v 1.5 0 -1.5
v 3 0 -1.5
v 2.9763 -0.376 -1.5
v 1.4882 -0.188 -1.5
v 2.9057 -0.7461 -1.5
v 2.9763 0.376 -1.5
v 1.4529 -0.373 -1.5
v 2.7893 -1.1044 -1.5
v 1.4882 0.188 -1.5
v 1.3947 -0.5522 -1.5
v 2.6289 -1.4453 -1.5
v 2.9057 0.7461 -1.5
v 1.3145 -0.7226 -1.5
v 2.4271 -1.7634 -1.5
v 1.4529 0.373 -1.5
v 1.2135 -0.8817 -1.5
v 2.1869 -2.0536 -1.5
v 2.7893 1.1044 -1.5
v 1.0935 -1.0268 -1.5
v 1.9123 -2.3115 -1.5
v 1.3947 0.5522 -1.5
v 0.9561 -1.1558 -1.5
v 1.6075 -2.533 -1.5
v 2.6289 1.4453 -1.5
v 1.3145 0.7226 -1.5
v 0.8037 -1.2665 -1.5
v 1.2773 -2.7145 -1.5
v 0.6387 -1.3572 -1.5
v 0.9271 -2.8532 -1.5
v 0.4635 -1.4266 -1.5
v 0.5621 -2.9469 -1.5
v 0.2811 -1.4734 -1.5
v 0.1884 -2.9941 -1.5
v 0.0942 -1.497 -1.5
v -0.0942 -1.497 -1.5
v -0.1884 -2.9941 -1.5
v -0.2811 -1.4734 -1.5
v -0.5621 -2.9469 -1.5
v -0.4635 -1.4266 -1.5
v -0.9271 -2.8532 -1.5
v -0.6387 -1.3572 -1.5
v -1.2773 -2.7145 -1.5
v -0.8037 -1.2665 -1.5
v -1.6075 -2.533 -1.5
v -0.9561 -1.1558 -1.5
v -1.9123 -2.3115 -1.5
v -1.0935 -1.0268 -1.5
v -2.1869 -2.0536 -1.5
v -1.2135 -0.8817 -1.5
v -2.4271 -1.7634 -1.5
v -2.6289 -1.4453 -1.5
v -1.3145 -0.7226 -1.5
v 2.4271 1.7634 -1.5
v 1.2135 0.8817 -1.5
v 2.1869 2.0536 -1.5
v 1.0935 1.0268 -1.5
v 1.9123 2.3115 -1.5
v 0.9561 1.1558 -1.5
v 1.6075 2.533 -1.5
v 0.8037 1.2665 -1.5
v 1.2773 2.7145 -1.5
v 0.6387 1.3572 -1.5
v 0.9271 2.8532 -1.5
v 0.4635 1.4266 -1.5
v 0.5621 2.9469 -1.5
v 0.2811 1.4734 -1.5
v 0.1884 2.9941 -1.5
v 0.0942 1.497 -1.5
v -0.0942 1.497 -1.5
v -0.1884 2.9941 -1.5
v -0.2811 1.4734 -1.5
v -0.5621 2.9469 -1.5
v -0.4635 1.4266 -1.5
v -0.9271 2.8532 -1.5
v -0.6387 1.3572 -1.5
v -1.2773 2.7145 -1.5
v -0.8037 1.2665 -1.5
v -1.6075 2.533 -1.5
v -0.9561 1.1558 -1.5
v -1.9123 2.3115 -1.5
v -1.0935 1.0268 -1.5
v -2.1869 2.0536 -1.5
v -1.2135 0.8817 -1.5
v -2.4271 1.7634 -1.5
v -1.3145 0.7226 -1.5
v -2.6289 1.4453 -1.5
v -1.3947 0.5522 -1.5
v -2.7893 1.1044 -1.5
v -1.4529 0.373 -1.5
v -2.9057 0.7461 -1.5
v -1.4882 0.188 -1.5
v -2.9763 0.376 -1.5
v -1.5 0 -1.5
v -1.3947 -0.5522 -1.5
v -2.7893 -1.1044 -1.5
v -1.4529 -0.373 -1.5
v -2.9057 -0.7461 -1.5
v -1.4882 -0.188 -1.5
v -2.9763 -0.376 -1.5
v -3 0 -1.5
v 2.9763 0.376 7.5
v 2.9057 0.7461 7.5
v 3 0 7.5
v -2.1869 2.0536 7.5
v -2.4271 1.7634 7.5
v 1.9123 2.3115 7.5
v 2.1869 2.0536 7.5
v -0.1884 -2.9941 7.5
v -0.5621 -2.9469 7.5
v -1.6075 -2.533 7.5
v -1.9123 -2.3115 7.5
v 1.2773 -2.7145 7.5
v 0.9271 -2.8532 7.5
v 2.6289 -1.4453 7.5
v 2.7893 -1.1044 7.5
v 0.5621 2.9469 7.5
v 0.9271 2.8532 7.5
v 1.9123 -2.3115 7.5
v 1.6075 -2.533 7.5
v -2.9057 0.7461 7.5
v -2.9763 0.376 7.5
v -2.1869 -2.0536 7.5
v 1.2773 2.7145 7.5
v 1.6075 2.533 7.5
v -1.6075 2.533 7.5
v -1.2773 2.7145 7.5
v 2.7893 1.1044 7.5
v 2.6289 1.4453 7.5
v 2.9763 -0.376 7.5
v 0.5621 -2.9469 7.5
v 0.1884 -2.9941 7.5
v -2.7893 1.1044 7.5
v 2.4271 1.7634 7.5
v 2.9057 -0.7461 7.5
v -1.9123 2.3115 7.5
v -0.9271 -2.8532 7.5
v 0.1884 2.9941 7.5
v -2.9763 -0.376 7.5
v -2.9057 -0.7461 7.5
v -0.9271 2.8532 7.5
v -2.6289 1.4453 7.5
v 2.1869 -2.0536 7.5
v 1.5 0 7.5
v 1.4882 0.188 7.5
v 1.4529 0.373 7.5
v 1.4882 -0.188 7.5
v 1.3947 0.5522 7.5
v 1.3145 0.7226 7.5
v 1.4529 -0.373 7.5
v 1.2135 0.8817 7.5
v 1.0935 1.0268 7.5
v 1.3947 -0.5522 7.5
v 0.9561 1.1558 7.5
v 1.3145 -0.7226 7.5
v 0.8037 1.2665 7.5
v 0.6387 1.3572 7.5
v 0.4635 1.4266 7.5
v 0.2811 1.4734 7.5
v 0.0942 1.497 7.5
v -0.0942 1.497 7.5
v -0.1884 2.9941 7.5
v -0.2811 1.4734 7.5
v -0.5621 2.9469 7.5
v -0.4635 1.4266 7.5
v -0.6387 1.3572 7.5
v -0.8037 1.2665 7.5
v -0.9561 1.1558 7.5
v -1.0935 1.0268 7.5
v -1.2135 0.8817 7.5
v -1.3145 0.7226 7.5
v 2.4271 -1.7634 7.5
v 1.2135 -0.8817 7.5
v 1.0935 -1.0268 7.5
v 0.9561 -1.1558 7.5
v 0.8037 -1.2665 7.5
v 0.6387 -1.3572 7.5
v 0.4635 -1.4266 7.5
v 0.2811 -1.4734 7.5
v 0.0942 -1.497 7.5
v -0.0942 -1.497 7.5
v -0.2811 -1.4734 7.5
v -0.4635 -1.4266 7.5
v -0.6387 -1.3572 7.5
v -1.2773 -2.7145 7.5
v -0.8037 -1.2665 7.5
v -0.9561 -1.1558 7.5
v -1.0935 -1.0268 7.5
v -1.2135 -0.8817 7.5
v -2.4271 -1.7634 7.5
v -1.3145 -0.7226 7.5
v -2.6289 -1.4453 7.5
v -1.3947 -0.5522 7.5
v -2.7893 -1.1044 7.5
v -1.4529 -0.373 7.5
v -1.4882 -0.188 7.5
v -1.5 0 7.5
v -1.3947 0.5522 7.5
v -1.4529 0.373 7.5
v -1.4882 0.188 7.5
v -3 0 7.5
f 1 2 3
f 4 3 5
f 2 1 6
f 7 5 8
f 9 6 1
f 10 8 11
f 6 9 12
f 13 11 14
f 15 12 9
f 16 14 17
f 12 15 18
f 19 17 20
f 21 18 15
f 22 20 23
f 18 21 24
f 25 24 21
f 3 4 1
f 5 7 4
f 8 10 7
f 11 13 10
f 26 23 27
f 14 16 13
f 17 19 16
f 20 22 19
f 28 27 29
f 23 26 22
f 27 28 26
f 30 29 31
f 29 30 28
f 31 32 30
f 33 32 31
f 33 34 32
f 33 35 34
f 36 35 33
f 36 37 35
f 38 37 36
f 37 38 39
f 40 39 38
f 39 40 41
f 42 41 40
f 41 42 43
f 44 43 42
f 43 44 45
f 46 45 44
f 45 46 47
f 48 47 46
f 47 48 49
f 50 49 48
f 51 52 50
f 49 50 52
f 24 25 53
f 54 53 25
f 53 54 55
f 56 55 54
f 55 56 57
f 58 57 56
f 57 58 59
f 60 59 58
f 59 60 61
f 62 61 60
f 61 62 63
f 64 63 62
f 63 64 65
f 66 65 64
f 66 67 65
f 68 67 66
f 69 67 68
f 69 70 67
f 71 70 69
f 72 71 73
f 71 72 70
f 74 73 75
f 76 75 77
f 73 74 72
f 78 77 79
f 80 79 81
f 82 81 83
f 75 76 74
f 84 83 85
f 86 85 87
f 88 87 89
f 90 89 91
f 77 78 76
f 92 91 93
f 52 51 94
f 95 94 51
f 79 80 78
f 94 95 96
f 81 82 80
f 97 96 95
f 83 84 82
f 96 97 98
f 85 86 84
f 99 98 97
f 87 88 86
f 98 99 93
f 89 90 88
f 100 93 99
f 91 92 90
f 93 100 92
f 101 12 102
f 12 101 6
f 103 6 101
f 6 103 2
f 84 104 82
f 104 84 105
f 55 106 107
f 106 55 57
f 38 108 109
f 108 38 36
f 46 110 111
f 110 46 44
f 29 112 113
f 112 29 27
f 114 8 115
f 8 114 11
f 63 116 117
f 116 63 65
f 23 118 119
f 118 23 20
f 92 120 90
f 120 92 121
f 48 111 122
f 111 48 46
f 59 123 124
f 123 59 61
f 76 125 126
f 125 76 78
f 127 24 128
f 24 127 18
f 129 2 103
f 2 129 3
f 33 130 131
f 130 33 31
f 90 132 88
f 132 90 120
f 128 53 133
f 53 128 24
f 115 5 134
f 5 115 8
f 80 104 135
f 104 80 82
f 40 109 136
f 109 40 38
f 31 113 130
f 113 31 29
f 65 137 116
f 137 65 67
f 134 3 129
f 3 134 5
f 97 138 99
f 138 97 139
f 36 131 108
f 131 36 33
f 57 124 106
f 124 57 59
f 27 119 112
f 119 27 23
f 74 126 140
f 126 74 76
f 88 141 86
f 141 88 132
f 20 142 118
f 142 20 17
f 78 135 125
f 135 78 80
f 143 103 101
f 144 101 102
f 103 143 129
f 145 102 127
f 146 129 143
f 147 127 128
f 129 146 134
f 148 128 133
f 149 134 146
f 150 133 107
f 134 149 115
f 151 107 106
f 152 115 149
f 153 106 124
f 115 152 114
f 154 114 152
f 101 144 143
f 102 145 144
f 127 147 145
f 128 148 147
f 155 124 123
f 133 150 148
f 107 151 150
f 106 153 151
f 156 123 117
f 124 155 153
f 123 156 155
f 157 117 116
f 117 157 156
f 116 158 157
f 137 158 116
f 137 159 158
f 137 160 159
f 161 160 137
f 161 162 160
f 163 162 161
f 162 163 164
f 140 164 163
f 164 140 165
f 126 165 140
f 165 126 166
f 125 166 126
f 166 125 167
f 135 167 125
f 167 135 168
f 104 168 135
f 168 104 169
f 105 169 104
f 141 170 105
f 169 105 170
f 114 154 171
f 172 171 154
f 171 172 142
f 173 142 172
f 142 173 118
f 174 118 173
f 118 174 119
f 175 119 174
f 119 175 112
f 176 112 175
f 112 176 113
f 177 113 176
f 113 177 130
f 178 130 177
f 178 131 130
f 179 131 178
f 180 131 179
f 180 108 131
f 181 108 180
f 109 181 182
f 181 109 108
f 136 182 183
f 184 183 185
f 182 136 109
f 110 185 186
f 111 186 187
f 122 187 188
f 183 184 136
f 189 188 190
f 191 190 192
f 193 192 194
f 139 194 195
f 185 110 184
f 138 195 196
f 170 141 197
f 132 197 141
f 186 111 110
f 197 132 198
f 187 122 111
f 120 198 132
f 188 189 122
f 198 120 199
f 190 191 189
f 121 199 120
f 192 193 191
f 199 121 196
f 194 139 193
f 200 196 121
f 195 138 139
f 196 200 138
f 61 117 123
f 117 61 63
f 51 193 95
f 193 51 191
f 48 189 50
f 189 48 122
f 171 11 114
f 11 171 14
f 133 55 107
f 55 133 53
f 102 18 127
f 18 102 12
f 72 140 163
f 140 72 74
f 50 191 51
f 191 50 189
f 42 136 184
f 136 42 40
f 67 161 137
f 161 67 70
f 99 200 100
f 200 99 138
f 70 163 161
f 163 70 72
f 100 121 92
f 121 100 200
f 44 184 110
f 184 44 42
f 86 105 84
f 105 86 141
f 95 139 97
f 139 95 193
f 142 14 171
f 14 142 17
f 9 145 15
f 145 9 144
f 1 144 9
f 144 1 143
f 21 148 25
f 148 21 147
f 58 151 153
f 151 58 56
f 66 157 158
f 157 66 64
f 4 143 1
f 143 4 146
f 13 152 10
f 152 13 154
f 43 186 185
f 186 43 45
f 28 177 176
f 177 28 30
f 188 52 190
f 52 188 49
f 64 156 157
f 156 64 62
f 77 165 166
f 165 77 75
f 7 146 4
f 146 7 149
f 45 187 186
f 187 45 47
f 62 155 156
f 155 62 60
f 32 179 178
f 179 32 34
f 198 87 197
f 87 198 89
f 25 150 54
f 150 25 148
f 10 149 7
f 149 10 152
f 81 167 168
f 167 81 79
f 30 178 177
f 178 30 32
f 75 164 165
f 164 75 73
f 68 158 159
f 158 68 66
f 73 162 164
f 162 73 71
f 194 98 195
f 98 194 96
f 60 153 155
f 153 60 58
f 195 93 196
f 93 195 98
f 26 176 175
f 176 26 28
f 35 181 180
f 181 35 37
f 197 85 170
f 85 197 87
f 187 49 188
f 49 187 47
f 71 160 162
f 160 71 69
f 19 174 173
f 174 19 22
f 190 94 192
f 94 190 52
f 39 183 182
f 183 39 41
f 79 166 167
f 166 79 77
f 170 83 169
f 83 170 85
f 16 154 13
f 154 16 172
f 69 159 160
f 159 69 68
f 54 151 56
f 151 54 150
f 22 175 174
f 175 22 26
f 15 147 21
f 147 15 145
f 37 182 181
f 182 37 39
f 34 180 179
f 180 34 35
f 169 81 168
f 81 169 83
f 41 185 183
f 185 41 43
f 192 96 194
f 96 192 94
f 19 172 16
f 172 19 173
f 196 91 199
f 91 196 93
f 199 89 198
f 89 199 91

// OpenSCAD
$fn = 50;


difference() {
	union() {
		translate(v = [0, 0, -1.5000000000]) {
			cylinder(h = 3, r = 1.0000000000);
		}
		translate(v = [0, 0, -1.5000000000]) {
			cylinder(h = 9, r = 3.0000000000);
		}
	}
	union() {
		translate(v = [0, 0, -50.0000000000]) {
			cylinder(h = 100, r = 1.5000000000);
		}
	}
}
